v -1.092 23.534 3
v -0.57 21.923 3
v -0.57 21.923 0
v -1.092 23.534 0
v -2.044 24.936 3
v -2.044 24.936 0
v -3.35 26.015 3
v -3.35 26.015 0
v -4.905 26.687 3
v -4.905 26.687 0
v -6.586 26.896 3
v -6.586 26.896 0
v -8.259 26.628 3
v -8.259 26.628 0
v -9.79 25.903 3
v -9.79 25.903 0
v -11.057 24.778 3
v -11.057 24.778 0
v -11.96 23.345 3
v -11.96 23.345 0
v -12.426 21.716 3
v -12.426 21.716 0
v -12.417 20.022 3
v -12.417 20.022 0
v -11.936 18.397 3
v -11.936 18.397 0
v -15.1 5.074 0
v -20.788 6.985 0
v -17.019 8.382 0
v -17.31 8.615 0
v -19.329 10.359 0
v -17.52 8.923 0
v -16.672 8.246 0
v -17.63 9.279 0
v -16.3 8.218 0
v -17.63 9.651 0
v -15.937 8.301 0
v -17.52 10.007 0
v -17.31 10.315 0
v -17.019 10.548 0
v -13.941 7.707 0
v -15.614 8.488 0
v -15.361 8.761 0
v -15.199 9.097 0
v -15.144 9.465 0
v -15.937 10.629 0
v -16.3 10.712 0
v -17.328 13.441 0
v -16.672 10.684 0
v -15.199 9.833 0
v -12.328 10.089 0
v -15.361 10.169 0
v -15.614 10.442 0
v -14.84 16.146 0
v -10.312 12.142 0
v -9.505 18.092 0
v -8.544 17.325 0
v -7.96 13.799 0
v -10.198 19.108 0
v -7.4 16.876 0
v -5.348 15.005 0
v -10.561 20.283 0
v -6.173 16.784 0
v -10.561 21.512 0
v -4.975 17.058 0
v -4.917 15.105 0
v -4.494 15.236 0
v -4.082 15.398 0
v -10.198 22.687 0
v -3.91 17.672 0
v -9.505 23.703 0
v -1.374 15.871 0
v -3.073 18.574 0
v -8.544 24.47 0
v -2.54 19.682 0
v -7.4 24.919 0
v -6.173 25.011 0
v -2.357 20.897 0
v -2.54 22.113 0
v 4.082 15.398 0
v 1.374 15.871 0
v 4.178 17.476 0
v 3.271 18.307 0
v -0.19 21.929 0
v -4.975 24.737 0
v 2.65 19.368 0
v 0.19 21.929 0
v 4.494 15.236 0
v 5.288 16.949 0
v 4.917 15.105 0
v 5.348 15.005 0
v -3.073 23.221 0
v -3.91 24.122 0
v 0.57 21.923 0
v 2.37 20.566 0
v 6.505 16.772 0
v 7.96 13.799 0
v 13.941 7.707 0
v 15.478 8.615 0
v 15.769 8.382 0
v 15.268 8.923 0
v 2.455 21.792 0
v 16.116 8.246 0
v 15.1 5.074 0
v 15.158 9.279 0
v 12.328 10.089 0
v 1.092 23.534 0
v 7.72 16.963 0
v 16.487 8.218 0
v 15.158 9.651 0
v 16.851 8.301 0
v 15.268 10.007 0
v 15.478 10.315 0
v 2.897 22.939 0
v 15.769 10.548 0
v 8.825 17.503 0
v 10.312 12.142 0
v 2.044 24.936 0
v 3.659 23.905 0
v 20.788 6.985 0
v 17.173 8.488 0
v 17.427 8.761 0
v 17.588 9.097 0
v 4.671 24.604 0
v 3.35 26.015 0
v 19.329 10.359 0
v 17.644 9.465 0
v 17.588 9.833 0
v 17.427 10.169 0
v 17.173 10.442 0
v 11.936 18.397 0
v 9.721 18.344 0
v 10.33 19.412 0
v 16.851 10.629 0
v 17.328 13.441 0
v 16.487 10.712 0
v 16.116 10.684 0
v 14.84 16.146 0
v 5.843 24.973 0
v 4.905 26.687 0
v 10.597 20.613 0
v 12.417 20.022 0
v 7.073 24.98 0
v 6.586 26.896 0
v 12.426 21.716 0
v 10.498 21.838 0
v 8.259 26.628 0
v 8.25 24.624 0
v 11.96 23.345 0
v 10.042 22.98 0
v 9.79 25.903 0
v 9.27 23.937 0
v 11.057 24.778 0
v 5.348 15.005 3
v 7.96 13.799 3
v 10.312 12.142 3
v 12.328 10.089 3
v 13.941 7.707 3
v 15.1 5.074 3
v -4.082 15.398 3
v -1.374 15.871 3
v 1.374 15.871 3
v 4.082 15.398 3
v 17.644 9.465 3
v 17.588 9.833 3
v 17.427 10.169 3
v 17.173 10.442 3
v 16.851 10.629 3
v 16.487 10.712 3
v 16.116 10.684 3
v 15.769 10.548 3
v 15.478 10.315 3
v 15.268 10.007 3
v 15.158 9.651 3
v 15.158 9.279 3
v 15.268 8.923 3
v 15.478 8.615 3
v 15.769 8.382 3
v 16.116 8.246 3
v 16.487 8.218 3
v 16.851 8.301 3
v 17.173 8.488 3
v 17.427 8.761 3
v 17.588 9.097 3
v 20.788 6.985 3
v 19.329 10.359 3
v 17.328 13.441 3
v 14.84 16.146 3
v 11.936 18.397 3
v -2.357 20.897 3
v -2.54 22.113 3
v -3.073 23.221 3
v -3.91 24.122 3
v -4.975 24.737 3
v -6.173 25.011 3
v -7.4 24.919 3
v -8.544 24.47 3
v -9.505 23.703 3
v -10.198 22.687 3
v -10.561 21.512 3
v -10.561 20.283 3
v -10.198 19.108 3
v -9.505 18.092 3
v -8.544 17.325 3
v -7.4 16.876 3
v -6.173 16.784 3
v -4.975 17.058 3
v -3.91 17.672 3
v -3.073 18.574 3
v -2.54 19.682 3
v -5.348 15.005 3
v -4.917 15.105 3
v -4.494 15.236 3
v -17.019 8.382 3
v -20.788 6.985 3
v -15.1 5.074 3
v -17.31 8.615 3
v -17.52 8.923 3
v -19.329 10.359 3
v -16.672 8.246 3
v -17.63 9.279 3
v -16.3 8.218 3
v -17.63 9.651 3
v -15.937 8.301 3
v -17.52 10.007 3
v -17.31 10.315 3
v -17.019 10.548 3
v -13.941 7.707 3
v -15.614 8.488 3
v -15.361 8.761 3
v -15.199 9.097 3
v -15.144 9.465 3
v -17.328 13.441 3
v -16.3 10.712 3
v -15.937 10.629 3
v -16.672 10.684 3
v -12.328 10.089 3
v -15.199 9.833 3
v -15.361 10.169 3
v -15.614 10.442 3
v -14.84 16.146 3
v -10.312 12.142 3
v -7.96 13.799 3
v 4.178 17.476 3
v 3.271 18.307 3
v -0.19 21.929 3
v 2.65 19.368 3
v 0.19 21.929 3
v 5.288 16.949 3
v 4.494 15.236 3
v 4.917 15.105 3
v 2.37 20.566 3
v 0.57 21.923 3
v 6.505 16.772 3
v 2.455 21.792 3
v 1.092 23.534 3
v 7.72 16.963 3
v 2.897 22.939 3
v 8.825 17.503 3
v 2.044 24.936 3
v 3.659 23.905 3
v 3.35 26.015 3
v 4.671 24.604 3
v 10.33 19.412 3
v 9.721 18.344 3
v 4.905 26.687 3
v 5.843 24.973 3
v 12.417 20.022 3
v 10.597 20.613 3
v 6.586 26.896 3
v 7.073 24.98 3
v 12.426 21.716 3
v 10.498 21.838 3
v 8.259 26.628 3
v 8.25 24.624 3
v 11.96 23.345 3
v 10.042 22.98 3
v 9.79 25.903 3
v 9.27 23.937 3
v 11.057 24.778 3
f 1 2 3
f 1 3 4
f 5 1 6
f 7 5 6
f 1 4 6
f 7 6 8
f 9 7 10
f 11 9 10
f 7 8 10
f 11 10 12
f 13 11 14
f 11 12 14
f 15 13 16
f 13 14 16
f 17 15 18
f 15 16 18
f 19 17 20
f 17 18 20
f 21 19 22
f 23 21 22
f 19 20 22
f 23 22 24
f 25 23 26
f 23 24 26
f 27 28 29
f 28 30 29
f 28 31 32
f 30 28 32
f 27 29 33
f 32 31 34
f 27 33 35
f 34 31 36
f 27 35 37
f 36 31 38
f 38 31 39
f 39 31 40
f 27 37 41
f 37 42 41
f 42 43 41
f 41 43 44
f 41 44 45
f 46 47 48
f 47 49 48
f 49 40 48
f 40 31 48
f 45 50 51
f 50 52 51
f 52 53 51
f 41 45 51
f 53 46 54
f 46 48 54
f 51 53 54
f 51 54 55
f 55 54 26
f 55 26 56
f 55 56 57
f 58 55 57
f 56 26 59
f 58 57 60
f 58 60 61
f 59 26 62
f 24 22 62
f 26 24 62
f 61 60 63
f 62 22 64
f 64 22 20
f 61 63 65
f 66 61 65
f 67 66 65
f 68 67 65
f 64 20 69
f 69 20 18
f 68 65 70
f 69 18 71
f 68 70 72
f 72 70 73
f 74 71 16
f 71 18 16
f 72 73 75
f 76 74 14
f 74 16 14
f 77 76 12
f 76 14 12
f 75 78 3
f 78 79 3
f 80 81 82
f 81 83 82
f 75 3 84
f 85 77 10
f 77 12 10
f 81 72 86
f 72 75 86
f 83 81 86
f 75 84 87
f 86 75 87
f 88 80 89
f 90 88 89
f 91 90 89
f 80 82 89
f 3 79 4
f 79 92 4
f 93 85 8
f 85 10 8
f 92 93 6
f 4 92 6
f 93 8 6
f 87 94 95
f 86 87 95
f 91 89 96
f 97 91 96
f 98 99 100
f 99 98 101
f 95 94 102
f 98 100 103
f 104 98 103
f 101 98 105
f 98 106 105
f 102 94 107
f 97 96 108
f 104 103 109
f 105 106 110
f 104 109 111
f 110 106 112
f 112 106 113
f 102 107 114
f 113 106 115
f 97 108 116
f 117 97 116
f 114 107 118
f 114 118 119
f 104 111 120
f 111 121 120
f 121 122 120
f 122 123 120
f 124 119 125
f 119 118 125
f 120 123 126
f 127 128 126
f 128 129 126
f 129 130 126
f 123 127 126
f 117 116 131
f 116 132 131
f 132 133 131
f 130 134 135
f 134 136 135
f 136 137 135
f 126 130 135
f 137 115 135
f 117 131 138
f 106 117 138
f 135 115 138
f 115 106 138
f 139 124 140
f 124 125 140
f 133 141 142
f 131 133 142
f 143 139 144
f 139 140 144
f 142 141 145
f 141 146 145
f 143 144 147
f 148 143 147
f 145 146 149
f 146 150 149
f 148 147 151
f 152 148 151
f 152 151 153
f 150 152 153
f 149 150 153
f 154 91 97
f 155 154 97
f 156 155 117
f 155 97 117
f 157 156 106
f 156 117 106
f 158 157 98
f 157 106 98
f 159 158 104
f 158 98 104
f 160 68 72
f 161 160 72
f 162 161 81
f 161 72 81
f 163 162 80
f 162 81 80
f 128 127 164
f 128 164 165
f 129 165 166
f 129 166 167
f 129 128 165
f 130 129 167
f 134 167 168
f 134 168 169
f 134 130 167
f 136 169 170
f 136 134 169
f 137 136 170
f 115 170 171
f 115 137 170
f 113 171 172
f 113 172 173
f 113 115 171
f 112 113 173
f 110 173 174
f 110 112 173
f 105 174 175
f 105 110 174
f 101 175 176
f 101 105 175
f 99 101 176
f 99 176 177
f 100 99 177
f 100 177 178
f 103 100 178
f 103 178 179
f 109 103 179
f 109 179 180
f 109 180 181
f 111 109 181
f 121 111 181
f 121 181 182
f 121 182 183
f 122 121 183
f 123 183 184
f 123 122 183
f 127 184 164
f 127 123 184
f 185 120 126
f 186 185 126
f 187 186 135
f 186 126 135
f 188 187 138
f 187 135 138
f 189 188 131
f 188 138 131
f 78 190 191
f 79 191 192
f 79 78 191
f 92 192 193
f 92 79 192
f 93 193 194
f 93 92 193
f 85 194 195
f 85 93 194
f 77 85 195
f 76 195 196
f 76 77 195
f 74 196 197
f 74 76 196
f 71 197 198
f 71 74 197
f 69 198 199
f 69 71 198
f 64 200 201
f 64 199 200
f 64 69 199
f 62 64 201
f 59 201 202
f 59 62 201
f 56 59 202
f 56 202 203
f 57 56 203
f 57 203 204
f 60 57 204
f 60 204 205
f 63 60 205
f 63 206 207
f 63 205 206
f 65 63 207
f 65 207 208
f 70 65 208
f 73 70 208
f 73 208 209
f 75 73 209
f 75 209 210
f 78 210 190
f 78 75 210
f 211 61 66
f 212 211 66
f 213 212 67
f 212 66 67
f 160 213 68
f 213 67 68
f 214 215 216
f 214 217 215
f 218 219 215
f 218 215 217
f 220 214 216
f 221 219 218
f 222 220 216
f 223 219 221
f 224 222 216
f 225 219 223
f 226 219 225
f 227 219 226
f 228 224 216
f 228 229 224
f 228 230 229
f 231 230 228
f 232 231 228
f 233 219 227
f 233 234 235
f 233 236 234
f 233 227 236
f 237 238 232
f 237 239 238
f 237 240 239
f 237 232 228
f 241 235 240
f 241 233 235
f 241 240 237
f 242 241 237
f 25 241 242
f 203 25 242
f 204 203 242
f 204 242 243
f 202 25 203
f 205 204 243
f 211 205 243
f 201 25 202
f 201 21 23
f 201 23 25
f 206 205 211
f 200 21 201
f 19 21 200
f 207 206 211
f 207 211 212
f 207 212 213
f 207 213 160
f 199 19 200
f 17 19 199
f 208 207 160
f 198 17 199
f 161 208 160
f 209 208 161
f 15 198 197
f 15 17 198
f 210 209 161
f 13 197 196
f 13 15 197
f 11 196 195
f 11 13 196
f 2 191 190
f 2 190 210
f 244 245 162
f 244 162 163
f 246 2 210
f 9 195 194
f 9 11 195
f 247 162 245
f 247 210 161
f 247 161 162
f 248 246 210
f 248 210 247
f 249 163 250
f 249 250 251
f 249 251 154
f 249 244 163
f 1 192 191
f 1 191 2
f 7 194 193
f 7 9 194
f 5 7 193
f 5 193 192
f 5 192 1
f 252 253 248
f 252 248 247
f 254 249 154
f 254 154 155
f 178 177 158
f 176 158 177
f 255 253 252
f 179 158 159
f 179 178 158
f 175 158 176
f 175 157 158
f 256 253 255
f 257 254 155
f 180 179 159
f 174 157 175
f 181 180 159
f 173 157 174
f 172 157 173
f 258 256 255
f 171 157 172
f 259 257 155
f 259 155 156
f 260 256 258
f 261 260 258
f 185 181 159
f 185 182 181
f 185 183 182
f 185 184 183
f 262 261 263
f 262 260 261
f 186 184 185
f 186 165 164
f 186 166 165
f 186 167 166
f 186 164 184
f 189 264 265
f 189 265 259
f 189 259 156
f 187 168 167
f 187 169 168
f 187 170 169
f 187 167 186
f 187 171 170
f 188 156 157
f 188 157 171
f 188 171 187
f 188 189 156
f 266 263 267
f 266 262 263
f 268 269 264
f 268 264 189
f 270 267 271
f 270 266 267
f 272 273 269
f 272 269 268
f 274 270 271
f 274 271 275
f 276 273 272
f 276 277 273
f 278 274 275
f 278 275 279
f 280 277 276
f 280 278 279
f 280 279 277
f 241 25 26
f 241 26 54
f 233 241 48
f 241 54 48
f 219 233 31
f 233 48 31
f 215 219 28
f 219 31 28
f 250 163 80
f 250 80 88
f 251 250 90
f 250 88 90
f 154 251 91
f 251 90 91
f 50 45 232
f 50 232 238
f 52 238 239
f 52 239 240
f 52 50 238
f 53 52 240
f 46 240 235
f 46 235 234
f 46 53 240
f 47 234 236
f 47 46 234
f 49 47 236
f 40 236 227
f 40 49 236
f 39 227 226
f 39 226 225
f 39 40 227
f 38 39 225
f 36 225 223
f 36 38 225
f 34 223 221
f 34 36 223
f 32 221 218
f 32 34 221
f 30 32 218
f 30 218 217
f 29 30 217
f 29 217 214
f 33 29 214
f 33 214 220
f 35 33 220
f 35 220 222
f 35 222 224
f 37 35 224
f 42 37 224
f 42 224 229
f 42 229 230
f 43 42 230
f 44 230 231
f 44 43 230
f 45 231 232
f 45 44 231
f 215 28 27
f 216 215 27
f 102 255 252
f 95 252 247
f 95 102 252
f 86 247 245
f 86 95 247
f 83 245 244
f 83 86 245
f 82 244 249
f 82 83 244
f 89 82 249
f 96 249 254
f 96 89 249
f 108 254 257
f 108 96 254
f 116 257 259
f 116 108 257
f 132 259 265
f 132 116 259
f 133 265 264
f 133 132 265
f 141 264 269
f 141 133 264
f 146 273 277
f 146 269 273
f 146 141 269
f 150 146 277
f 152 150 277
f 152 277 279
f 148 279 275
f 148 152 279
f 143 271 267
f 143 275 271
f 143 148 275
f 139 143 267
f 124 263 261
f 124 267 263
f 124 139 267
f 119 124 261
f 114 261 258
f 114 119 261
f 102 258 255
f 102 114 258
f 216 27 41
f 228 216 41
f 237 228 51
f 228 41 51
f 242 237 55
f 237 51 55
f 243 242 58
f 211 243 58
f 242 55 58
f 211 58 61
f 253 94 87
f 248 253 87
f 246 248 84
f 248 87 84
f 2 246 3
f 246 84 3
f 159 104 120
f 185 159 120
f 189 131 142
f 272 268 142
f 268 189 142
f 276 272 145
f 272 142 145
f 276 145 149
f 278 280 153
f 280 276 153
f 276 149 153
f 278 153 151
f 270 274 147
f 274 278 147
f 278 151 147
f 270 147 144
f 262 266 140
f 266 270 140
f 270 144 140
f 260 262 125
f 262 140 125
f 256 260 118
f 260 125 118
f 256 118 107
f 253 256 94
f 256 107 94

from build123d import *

# Parameters (mm, degrees)
F0_R     = 1.25
F1_DEPTH = 3
F2_R     = 6
F2_R_2   = 4.125
F3_DEPTH = 3
F4_DEPTH = 13.63532


with BuildPart() as f1:
    # F0 (on Top) → F1 (new body)
    with BuildSketch(Plane.XY):
        with BuildLine():
            Line((-20.787705, 6.985428), (-15.100235, 5.07423))
            ThreePointArc((-15.100235, 5.07423), (0, 15.93), (15.100235, 5.07423))
            Line((15.100235, 5.07423), (20.787705, 6.985428))
            ThreePointArc((20.787705, 6.985428), (0, 21.93), (-20.787705, 6.985428))
        make_face()
        with Locations((-16.393861, 9.465)):
            Circle(F0_R, mode=Mode.SUBTRACT)
        with Locations((16.393861, 9.465)):
            Circle(F0_R, mode=Mode.SUBTRACT)
    extrude(amount=F1_DEPTH)

    # F2 (on Top) → F3 (join)
    with BuildSketch(Plane.XY):
        with Locations((6.481612, 20.897385)):
            Circle(F2_R)
        with Locations((6.481612, 20.897385)):
            Circle(F2_R_2, mode=Mode.SUBTRACT)
        with Locations((-6.481612, 20.897385)):
            Circle(F2_R)
        with Locations((-6.481612, 20.897385)):
            Circle(F2_R_2, mode=Mode.SUBTRACT)
    extrude(amount=F3_DEPTH)

    # F2 (on Top) → F4 (cut)
    with BuildSketch(Plane.XY):
        with Locations((-6.481612, 20.897385)):
            Circle(F2_R_2)
        with Locations((6.481612, 20.897385)):
            Circle(F2_R_2)
    extrude(amount=F4_DEPTH, mode=Mode.SUBTRACT)


solid = f1.part
